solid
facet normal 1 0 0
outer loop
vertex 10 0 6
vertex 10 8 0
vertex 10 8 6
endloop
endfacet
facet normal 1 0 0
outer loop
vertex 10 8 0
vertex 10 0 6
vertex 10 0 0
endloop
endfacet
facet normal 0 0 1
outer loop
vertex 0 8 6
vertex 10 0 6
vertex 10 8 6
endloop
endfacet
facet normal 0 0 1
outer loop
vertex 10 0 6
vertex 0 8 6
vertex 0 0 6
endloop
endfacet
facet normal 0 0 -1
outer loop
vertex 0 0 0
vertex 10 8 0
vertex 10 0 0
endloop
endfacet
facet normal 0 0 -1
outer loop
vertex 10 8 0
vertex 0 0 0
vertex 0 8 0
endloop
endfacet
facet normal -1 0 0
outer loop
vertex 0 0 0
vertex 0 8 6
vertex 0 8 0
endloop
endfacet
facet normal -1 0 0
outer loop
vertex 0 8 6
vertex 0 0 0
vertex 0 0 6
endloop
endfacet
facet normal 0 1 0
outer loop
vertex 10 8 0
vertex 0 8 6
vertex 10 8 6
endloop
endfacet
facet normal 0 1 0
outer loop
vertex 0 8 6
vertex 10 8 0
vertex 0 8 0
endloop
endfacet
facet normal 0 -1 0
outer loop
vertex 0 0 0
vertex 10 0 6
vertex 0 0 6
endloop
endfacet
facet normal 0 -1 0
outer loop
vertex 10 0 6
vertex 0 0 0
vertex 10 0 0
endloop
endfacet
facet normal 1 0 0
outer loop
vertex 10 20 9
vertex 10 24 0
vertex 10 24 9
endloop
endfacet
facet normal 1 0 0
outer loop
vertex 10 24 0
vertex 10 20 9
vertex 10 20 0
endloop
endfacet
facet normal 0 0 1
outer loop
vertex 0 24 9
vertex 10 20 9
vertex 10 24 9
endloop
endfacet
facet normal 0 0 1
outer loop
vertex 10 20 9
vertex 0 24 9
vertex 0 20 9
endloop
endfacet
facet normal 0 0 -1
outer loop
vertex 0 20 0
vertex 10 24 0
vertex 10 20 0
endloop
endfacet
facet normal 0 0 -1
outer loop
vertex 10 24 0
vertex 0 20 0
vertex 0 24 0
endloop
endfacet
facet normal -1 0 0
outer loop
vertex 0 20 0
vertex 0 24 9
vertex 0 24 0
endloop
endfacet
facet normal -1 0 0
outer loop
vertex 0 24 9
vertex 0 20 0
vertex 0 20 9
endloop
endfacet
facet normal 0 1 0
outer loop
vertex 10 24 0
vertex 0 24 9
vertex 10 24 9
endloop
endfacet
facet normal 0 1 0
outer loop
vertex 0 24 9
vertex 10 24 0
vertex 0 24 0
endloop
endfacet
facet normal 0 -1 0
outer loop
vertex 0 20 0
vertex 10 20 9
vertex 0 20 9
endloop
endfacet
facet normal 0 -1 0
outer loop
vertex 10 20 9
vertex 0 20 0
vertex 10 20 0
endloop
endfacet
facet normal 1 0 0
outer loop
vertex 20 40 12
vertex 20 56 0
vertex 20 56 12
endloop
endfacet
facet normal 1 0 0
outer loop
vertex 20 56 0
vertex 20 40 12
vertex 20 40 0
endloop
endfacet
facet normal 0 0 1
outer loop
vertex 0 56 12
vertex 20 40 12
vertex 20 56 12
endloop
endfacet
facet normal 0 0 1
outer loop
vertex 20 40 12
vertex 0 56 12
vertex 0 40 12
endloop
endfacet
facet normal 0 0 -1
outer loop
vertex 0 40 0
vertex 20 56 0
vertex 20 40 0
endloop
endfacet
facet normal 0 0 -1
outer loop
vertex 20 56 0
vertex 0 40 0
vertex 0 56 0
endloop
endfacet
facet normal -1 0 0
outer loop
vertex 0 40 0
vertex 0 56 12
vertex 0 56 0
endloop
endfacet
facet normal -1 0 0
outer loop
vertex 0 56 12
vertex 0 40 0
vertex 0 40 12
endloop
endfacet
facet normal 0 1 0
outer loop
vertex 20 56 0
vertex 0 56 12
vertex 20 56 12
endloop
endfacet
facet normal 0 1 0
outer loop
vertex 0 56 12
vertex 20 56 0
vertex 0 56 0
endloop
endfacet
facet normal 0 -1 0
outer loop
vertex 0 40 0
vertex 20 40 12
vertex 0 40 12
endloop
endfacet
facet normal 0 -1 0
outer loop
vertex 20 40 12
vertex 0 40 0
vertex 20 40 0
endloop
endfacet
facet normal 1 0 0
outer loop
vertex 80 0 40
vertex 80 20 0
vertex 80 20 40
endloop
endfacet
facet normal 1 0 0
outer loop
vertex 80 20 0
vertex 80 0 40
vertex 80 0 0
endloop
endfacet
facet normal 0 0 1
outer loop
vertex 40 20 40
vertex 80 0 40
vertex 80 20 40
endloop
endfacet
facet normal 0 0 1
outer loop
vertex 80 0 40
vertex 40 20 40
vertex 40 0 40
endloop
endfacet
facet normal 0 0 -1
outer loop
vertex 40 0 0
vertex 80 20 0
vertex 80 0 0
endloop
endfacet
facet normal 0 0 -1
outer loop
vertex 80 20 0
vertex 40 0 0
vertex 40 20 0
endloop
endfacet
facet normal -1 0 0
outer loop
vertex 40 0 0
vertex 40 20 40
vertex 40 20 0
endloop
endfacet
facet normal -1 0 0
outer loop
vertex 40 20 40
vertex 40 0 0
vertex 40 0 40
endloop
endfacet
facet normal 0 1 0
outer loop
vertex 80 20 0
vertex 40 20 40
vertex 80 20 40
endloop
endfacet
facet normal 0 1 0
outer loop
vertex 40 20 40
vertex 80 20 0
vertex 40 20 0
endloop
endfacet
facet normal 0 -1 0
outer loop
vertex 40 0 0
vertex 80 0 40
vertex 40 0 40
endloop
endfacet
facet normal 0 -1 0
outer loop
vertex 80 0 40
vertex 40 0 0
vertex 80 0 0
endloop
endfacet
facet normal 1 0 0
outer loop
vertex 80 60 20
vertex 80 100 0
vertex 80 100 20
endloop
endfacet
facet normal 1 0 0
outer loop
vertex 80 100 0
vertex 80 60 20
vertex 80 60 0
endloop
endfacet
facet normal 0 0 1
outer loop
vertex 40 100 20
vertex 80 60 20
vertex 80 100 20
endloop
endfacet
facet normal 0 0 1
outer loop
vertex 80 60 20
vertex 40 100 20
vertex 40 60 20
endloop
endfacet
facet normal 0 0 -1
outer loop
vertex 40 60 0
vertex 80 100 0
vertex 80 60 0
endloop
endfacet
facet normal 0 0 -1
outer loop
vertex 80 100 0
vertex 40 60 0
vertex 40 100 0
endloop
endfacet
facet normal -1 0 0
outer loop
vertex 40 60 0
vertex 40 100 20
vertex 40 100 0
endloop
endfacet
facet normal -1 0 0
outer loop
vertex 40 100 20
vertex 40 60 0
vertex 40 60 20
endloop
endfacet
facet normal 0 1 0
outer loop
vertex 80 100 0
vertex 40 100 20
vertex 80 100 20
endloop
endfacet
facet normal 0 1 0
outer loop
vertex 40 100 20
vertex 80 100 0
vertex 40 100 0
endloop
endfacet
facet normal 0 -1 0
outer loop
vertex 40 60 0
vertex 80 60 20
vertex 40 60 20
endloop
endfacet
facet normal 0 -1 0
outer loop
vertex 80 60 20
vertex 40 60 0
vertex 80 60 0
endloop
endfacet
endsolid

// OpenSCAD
// scale and resize
scale(2) cube([5, 4, 3]);
translate([0, 20, 0]) scale([2, 1, 3]) cube([5, 4, 3]);
translate([0, 40, 0]) resize([20, 0, 0], auto = true) cube([5, 4, 3]);
// auto follows the axis with the LARGEST new size (OpenSCAD's maxdim), not the first one given
translate([40, 0, 0]) resize([0, 20, 40], auto = true) cube([10, 10, 10]);
translate([40, 60, 0]) resize([0, 40, 20], auto = true) cube([10, 10, 10]);
